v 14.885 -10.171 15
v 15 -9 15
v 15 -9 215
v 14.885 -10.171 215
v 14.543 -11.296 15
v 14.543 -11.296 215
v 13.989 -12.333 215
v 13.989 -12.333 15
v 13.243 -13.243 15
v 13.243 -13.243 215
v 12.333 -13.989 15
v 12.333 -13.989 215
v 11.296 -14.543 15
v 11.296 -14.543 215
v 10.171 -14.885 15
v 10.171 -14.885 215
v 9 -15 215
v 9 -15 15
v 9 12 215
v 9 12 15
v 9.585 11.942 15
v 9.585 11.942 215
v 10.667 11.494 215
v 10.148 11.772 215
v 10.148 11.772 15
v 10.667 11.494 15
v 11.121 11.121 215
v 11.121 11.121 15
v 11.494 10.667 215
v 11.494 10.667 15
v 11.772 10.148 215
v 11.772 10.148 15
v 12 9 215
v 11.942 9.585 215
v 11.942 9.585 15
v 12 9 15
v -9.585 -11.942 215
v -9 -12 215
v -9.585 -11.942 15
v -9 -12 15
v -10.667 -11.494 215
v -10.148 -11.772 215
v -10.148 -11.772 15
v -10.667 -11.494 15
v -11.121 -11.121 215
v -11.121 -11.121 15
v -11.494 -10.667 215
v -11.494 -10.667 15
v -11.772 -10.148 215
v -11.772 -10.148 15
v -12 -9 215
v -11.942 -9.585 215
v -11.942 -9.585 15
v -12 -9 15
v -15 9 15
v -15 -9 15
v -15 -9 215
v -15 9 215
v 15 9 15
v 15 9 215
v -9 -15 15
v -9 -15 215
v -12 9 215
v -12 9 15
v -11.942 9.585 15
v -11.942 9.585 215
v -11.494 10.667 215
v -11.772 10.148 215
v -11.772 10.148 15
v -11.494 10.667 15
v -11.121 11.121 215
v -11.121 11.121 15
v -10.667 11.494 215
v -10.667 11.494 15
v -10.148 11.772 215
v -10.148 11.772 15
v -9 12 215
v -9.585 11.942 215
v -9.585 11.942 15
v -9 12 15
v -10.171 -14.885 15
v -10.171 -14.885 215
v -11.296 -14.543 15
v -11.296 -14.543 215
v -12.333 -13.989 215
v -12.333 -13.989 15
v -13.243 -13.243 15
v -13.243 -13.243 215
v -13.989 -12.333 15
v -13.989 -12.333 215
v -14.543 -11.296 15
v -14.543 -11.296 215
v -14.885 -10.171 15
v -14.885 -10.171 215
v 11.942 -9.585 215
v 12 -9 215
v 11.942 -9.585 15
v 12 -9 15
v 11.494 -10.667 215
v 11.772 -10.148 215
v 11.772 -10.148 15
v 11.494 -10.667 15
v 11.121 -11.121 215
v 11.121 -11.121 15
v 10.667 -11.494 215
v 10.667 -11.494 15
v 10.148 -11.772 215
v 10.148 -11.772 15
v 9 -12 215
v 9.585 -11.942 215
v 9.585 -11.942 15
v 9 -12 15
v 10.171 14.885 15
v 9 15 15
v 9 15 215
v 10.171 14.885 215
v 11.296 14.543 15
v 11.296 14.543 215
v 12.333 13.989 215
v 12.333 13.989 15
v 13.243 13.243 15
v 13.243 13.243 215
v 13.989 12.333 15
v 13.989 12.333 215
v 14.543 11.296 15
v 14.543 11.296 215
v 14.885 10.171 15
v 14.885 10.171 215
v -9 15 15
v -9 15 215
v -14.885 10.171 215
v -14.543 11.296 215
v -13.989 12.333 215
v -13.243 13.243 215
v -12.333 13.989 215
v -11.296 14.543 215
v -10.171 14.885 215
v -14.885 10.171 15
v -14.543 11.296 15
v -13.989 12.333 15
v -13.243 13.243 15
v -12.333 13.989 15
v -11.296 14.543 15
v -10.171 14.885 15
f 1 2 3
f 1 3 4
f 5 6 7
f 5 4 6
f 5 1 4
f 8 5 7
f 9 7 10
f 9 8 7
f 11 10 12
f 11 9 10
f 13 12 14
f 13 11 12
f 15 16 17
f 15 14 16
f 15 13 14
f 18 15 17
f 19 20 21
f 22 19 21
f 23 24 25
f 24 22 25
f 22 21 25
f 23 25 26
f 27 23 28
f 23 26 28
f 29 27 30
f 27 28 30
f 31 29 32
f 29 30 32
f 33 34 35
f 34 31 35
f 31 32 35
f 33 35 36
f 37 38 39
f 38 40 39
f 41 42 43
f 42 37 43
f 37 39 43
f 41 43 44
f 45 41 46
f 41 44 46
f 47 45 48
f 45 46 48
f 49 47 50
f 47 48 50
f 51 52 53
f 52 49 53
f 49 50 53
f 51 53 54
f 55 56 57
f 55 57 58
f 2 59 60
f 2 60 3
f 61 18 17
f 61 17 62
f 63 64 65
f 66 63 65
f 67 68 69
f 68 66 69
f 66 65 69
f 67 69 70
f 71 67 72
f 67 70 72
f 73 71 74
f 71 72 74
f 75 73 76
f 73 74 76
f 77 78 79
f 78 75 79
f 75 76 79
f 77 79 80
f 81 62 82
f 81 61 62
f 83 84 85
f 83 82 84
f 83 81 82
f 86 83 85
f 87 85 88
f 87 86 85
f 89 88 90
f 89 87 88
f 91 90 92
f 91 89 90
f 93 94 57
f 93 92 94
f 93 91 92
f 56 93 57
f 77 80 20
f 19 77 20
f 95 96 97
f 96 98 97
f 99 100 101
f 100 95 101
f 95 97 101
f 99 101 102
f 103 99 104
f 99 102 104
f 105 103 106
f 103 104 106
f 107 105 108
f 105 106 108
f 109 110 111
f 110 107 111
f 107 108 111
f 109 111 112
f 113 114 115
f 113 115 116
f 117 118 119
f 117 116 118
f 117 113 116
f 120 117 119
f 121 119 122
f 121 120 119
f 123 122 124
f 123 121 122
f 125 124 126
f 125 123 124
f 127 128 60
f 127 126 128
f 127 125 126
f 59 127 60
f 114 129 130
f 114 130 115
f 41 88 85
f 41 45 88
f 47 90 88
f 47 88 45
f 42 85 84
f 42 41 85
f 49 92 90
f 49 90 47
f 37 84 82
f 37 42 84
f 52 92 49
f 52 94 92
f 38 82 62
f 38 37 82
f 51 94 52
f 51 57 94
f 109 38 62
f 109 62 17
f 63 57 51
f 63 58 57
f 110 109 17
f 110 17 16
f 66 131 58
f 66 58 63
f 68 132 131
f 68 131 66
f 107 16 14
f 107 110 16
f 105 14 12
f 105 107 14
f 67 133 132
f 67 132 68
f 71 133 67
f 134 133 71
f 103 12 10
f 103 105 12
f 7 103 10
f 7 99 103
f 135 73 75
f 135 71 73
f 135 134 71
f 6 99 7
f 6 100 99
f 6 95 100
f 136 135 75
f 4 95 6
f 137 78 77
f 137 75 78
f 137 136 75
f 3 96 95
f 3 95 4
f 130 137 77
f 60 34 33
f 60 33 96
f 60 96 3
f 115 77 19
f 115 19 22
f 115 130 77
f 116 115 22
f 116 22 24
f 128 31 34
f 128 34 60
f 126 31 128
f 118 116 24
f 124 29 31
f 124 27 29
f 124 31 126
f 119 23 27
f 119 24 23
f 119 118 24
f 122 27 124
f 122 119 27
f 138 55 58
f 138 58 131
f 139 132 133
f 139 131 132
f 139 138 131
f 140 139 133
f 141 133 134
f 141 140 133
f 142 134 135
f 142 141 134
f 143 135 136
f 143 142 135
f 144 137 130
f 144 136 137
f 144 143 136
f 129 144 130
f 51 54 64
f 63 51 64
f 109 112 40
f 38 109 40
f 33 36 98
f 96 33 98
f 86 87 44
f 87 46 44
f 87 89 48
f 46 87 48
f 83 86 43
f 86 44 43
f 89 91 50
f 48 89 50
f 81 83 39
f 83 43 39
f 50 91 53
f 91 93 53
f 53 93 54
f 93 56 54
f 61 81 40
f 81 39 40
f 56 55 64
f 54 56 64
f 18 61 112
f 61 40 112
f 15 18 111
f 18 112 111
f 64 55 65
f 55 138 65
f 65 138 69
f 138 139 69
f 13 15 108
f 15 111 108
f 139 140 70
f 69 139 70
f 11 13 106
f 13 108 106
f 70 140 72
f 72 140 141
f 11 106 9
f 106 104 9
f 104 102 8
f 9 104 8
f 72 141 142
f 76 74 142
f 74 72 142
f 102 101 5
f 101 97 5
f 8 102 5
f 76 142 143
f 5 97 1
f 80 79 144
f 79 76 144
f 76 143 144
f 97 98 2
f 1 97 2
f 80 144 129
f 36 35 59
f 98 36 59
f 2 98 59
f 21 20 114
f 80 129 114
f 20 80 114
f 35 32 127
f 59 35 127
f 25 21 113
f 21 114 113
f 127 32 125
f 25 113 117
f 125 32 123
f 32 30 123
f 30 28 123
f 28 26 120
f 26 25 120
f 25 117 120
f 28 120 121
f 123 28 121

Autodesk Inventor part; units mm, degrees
ref_plane "Start Plane" through (0, 0, 15) normal (0, 0, 1) x (1, 0, 0)
ref_plane "End Plane" through (0, 0, 215) normal (0, 0, 1) x (1, 0, 0)
sketch "Sketch" plane through (0, 0, 0) normal (0, 0, 1) x (1, 0, 0)
  line L0 (-15, -9) -> (-15, 9)
  line L1 (-9, 15) -> (9, 15)
  line L2 (15, 9) -> (15, -9)
  line L3 (9, -15) -> (-9, -15)
  arc A0 (-15, -9) -> (-9, -15) centre (-9, -9) ccw
  arc A1 (-9, 15) -> (-15, 9) centre (-9, 9) ccw
  arc A2 (15, 9) -> (9, 15) centre (9, 9) ccw
  arc A3 (9, -15) -> (15, -9) centre (9, -9) ccw
  arc A4 (-9, 12) -> (-12, 9) centre (-9, 9) ccw
  line L4 (-9, 12) -> (9, 12)
  arc A5 (12, 9) -> (9, 12) centre (9, 9) ccw
  line L5 (12, 9) -> (12, -9)
  arc A6 (9, -12) -> (12, -9) centre (9, -9) ccw
  line L6 (9, -12) -> (-9, -12)
  arc A7 (-12, -9) -> (-9, -12) centre (-9, -9) ccw
  line L7 (-12, -9) -> (-12, 9)
  line L8 (0, 22.7397) -> (0, -22.7397) construction
  line L9 (-22.7397, 0) -> (22.7397, 0) construction
  dimension "d7" = 6
  dimension "d10" = 30
  dimension "d11" = 30
  dimension "d12" = 3
  dimension "d15" = 15
  dimension "d16" = 15
extrude "Body" add sketch "Sketch" along normal up to surface (200 mm away) from surface at 15
sketch "Sketch3" plane through (0, 0, 0) normal (0, 0, 1) x (1, 0, 0)
  line L0 (0, 0) -> (10, 0)
ref_plane "Work Plane3" through (0, 0, 0) normal (0, -1, 0) x (1, 0, 0)
ref_plane "Work Plane4" through (678.5, -9, 215) normal (0, 0, 1) x (1, 0, 0)
split "Split1" plane through (678.5, -9, 215) removes the side toward (0, 0, 1)
ref_plane "Work Plane5" through (-521.5, -9, 15) normal (0, 0, -1) x (-1, 0, 0)
split "Split2" plane through (-521.5, -9, 15) removes the side toward (0, 0, -1)
sketch "Sketch4" plane through (0, 0, 0) normal (0, -1, 0) x (1, 0, 0)
  line L0 (-2, 15) -> (12, 15) projected
  line L1 (-2, 215) -> (12, 215) projected
  dimension "d18" = 200
equation "\"d7\" = G_IR"
equation "\"d10\" = G_H"
equation "\"d11\" = G_W"
equation "\"d12\" = G_T"
equation "\"d15\" = 0.5 * d10"
equation "\"d16\" = 0.5 * d11"
equation "\"d3\" = G_L"
equation "\"G_W\" = 30"
equation "\"G_H\" = 30"
equation "\"G_T\" = 3"
equation "\"G_IR\" = 6"
equation "\"G_L\" = d18"
equation "\"G_OFFSET_START\" = -15"
equation "\"G_OFFSET_END\" = -15"
equation "\"d13\" = -G_OFFSET_START"
equation "\"d14\" = G_OFFSET_END + B_L"
equation "\"B_L\" = 230"
properties part number "DIN EN 10219-2 - 30 x 30 x 3  - 200" material "Steel, Mild"
